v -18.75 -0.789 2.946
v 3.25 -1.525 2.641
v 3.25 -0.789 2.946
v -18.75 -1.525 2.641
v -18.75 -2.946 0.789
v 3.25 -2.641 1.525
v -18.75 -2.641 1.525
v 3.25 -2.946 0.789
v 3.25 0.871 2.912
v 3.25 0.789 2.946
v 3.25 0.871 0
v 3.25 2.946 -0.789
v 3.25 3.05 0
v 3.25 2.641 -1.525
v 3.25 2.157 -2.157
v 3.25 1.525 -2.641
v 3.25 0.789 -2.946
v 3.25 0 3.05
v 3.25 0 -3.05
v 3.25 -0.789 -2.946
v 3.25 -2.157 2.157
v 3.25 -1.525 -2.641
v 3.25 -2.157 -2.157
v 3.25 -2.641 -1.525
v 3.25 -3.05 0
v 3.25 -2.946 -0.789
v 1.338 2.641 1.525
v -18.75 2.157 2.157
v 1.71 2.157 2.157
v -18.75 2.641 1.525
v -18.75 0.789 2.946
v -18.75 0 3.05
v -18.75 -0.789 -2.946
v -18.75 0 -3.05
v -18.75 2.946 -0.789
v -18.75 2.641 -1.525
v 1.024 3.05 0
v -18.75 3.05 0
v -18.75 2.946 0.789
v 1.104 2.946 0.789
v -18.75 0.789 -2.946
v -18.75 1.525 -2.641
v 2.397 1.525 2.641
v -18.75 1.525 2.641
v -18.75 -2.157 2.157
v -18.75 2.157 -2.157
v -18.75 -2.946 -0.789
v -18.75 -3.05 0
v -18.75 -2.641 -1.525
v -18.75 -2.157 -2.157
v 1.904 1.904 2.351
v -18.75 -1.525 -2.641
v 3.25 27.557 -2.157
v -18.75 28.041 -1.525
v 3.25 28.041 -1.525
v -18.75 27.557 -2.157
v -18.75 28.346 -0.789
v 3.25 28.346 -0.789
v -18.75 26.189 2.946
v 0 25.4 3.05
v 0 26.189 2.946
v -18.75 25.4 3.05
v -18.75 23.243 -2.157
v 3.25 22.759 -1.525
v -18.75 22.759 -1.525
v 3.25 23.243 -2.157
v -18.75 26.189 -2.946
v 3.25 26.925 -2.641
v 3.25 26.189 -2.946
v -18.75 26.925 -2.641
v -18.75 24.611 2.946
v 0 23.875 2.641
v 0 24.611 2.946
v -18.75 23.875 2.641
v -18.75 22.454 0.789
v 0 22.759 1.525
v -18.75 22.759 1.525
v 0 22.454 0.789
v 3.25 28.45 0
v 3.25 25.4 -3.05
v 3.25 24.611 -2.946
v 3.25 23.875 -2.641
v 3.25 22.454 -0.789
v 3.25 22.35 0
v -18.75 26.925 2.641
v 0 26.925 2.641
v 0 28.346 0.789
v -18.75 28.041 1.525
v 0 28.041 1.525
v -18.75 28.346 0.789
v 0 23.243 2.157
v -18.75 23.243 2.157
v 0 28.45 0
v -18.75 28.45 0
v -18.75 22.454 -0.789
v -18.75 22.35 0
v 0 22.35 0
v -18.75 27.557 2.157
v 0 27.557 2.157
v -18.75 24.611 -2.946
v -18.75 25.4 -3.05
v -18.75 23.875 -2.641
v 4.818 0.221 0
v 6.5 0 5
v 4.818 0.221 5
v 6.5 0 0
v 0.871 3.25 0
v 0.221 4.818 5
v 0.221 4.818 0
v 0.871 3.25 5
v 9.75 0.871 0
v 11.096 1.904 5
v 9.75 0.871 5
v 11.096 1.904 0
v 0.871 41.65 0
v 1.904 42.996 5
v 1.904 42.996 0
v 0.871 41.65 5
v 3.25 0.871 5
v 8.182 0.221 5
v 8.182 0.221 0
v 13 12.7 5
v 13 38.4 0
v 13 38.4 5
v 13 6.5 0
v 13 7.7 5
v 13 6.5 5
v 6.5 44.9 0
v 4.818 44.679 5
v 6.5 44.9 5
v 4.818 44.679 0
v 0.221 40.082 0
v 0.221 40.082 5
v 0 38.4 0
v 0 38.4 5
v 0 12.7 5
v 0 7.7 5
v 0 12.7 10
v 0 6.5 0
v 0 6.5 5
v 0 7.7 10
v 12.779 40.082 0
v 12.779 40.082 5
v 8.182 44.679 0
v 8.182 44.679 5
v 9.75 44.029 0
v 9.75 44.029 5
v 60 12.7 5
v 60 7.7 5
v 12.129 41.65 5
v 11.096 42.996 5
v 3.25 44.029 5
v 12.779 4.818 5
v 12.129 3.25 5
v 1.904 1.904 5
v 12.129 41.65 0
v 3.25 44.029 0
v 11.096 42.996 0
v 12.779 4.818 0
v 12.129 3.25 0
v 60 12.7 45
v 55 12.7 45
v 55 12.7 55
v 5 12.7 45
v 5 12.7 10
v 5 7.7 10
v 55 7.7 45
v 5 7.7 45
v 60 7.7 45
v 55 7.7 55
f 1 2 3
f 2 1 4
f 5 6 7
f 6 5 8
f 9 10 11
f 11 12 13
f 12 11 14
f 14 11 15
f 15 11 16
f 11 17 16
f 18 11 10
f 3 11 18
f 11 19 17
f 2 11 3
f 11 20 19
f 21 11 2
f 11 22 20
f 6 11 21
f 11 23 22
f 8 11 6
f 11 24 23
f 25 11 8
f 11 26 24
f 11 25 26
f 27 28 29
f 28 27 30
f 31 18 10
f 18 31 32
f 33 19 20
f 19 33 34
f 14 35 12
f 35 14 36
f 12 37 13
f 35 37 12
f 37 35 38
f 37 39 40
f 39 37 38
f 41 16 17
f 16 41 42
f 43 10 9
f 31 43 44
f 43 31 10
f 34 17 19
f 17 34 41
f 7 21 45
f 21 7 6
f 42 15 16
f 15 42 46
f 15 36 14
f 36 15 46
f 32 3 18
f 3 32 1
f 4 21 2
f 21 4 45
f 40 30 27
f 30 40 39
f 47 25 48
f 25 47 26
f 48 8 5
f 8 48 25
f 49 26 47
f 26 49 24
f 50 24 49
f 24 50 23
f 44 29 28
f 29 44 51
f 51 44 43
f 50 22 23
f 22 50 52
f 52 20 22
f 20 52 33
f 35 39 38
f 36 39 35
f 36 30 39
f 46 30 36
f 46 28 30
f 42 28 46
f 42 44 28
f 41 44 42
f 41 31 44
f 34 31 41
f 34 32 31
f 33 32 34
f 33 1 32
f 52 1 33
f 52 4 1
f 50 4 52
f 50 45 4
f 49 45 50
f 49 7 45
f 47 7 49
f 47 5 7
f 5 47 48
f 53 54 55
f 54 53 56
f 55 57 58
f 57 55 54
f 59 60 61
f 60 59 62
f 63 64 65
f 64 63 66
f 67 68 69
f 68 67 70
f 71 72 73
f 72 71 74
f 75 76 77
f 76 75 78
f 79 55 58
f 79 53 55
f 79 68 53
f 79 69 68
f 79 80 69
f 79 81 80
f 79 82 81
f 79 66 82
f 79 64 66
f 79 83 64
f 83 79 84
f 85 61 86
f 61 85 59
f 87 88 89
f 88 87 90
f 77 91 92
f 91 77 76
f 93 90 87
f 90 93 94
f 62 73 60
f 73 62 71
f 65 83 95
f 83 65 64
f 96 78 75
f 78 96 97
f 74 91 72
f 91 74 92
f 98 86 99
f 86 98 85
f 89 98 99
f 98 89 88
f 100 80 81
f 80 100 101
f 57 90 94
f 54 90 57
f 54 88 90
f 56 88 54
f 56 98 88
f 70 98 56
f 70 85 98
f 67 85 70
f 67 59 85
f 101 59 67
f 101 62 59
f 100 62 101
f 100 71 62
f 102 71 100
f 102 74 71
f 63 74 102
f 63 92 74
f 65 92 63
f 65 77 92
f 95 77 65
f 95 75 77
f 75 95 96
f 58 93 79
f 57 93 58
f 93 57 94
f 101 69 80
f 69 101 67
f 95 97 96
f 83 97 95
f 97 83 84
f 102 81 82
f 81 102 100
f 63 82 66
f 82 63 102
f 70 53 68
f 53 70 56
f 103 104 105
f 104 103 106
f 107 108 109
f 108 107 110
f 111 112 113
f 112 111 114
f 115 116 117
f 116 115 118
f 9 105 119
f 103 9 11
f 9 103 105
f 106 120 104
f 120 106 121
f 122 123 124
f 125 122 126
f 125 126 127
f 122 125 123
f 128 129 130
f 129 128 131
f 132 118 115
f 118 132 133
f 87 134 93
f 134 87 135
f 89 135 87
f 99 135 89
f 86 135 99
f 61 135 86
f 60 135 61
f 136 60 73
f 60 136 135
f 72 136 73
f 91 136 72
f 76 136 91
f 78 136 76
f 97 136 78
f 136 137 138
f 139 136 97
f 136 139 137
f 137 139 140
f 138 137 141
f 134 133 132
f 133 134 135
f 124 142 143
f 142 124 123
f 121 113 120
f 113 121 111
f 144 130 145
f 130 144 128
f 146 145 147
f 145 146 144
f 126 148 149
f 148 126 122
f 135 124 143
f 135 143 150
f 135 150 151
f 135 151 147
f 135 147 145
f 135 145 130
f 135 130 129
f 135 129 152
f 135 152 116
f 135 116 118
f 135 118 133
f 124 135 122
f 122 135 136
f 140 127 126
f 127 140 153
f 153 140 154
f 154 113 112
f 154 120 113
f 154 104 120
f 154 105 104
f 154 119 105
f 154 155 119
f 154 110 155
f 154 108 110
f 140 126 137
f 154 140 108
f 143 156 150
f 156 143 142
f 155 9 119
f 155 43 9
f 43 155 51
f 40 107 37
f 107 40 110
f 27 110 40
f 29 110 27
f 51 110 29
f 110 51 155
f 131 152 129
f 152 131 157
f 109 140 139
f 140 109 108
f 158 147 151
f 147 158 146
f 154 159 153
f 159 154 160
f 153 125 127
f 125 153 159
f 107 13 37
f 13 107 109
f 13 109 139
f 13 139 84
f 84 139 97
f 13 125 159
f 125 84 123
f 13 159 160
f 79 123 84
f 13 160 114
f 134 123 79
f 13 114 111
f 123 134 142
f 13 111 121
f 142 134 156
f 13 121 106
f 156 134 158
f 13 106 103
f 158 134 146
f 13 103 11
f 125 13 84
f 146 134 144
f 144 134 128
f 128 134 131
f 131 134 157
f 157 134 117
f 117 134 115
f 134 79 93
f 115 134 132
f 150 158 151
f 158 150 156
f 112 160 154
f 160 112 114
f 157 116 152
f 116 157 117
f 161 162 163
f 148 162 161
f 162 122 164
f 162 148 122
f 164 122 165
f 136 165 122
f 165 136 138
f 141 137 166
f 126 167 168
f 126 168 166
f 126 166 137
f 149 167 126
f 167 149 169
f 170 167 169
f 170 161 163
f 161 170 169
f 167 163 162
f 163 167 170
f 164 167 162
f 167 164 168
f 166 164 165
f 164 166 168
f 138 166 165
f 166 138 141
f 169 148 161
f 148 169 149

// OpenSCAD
// ============================================================
// Pegboard Hook — Standard 1" (25.4mm) pegboard pattern
// ============================================================
// Parametric hook for standard pegboard storage walls.
// Adjust hook geometry for different tool types.

// ---- PARAMETERS ----
// Pegboard
hole_dia    = 6.5;   // Peg hole diameter (standard 1/4" = 6.35mm, use 6.5mm clearance)
hole_pitch  = 25.4;  // Hole spacing (standard 1" = 25.4mm)
peg_rows    = 2;     // How many holes to engage (1 = single, 2 = more stable)

// Hook geometry
hook_reach  = 60;    // How far hook extends from wall (mm)
hook_h      = 40;    // Vertical height of hook opening (mm)
hook_t      = 5;     // Hook arm thickness (mm)
hook_tip    = 10;    // Upward tip at end to prevent items falling off (mm)
load_cap    = 500;   // Expected load in grams (used in export checklist)

// ---- PEG PINS ----
// Cylindrical pins that insert into pegboard holes
module peg_pin(row) {
    peg_len = 22;    // Standard pegboard depth clearance
    translate([hole_dia/2, row * hole_pitch, 0])
    rotate([0, -90, 0])
    cylinder(d=hole_dia - 0.4, h=peg_len, $fn=24);
}

// ---- BACK PLATE ----
module back_plate() {
    plate_w = hole_dia * 2 + 4;
    plate_h = (peg_rows - 1) * hole_pitch + hole_dia * 3;
    hull() {
        for (y = [hole_dia, plate_h - hole_dia])
            translate([hole_dia, y, 0]) cylinder(r=hole_dia, h=hook_t, $fn=24);
    }
}

// ---- HORIZONTAL ARM ----
module arm() {
    translate([0, (peg_rows - 1) * hole_pitch / 2, hook_t])
    rotate([90, 0, 0])
    linear_extrude(hook_t)
    polygon([
        [0, 0],
        [hook_reach, 0],
        [hook_reach, hook_h],
        [hook_reach - hook_t, hook_h + hook_tip],  // tip curve
        [hook_reach - hook_t, hook_h],
        [hook_t, hook_h],
        [hook_t, hook_t],
        [0, hook_t]
    ]);
}

// ---- ASSEMBLE ----
union() {
    back_plate();
    for (row = [0 : peg_rows - 1]) {
        peg_pin(row);
    }
    arm();
}

// ---- ECHO LOAD INFO ----
echo(str("Expected load: ", load_cap, "g — inspect wall anchoring for loads >1kg"));
